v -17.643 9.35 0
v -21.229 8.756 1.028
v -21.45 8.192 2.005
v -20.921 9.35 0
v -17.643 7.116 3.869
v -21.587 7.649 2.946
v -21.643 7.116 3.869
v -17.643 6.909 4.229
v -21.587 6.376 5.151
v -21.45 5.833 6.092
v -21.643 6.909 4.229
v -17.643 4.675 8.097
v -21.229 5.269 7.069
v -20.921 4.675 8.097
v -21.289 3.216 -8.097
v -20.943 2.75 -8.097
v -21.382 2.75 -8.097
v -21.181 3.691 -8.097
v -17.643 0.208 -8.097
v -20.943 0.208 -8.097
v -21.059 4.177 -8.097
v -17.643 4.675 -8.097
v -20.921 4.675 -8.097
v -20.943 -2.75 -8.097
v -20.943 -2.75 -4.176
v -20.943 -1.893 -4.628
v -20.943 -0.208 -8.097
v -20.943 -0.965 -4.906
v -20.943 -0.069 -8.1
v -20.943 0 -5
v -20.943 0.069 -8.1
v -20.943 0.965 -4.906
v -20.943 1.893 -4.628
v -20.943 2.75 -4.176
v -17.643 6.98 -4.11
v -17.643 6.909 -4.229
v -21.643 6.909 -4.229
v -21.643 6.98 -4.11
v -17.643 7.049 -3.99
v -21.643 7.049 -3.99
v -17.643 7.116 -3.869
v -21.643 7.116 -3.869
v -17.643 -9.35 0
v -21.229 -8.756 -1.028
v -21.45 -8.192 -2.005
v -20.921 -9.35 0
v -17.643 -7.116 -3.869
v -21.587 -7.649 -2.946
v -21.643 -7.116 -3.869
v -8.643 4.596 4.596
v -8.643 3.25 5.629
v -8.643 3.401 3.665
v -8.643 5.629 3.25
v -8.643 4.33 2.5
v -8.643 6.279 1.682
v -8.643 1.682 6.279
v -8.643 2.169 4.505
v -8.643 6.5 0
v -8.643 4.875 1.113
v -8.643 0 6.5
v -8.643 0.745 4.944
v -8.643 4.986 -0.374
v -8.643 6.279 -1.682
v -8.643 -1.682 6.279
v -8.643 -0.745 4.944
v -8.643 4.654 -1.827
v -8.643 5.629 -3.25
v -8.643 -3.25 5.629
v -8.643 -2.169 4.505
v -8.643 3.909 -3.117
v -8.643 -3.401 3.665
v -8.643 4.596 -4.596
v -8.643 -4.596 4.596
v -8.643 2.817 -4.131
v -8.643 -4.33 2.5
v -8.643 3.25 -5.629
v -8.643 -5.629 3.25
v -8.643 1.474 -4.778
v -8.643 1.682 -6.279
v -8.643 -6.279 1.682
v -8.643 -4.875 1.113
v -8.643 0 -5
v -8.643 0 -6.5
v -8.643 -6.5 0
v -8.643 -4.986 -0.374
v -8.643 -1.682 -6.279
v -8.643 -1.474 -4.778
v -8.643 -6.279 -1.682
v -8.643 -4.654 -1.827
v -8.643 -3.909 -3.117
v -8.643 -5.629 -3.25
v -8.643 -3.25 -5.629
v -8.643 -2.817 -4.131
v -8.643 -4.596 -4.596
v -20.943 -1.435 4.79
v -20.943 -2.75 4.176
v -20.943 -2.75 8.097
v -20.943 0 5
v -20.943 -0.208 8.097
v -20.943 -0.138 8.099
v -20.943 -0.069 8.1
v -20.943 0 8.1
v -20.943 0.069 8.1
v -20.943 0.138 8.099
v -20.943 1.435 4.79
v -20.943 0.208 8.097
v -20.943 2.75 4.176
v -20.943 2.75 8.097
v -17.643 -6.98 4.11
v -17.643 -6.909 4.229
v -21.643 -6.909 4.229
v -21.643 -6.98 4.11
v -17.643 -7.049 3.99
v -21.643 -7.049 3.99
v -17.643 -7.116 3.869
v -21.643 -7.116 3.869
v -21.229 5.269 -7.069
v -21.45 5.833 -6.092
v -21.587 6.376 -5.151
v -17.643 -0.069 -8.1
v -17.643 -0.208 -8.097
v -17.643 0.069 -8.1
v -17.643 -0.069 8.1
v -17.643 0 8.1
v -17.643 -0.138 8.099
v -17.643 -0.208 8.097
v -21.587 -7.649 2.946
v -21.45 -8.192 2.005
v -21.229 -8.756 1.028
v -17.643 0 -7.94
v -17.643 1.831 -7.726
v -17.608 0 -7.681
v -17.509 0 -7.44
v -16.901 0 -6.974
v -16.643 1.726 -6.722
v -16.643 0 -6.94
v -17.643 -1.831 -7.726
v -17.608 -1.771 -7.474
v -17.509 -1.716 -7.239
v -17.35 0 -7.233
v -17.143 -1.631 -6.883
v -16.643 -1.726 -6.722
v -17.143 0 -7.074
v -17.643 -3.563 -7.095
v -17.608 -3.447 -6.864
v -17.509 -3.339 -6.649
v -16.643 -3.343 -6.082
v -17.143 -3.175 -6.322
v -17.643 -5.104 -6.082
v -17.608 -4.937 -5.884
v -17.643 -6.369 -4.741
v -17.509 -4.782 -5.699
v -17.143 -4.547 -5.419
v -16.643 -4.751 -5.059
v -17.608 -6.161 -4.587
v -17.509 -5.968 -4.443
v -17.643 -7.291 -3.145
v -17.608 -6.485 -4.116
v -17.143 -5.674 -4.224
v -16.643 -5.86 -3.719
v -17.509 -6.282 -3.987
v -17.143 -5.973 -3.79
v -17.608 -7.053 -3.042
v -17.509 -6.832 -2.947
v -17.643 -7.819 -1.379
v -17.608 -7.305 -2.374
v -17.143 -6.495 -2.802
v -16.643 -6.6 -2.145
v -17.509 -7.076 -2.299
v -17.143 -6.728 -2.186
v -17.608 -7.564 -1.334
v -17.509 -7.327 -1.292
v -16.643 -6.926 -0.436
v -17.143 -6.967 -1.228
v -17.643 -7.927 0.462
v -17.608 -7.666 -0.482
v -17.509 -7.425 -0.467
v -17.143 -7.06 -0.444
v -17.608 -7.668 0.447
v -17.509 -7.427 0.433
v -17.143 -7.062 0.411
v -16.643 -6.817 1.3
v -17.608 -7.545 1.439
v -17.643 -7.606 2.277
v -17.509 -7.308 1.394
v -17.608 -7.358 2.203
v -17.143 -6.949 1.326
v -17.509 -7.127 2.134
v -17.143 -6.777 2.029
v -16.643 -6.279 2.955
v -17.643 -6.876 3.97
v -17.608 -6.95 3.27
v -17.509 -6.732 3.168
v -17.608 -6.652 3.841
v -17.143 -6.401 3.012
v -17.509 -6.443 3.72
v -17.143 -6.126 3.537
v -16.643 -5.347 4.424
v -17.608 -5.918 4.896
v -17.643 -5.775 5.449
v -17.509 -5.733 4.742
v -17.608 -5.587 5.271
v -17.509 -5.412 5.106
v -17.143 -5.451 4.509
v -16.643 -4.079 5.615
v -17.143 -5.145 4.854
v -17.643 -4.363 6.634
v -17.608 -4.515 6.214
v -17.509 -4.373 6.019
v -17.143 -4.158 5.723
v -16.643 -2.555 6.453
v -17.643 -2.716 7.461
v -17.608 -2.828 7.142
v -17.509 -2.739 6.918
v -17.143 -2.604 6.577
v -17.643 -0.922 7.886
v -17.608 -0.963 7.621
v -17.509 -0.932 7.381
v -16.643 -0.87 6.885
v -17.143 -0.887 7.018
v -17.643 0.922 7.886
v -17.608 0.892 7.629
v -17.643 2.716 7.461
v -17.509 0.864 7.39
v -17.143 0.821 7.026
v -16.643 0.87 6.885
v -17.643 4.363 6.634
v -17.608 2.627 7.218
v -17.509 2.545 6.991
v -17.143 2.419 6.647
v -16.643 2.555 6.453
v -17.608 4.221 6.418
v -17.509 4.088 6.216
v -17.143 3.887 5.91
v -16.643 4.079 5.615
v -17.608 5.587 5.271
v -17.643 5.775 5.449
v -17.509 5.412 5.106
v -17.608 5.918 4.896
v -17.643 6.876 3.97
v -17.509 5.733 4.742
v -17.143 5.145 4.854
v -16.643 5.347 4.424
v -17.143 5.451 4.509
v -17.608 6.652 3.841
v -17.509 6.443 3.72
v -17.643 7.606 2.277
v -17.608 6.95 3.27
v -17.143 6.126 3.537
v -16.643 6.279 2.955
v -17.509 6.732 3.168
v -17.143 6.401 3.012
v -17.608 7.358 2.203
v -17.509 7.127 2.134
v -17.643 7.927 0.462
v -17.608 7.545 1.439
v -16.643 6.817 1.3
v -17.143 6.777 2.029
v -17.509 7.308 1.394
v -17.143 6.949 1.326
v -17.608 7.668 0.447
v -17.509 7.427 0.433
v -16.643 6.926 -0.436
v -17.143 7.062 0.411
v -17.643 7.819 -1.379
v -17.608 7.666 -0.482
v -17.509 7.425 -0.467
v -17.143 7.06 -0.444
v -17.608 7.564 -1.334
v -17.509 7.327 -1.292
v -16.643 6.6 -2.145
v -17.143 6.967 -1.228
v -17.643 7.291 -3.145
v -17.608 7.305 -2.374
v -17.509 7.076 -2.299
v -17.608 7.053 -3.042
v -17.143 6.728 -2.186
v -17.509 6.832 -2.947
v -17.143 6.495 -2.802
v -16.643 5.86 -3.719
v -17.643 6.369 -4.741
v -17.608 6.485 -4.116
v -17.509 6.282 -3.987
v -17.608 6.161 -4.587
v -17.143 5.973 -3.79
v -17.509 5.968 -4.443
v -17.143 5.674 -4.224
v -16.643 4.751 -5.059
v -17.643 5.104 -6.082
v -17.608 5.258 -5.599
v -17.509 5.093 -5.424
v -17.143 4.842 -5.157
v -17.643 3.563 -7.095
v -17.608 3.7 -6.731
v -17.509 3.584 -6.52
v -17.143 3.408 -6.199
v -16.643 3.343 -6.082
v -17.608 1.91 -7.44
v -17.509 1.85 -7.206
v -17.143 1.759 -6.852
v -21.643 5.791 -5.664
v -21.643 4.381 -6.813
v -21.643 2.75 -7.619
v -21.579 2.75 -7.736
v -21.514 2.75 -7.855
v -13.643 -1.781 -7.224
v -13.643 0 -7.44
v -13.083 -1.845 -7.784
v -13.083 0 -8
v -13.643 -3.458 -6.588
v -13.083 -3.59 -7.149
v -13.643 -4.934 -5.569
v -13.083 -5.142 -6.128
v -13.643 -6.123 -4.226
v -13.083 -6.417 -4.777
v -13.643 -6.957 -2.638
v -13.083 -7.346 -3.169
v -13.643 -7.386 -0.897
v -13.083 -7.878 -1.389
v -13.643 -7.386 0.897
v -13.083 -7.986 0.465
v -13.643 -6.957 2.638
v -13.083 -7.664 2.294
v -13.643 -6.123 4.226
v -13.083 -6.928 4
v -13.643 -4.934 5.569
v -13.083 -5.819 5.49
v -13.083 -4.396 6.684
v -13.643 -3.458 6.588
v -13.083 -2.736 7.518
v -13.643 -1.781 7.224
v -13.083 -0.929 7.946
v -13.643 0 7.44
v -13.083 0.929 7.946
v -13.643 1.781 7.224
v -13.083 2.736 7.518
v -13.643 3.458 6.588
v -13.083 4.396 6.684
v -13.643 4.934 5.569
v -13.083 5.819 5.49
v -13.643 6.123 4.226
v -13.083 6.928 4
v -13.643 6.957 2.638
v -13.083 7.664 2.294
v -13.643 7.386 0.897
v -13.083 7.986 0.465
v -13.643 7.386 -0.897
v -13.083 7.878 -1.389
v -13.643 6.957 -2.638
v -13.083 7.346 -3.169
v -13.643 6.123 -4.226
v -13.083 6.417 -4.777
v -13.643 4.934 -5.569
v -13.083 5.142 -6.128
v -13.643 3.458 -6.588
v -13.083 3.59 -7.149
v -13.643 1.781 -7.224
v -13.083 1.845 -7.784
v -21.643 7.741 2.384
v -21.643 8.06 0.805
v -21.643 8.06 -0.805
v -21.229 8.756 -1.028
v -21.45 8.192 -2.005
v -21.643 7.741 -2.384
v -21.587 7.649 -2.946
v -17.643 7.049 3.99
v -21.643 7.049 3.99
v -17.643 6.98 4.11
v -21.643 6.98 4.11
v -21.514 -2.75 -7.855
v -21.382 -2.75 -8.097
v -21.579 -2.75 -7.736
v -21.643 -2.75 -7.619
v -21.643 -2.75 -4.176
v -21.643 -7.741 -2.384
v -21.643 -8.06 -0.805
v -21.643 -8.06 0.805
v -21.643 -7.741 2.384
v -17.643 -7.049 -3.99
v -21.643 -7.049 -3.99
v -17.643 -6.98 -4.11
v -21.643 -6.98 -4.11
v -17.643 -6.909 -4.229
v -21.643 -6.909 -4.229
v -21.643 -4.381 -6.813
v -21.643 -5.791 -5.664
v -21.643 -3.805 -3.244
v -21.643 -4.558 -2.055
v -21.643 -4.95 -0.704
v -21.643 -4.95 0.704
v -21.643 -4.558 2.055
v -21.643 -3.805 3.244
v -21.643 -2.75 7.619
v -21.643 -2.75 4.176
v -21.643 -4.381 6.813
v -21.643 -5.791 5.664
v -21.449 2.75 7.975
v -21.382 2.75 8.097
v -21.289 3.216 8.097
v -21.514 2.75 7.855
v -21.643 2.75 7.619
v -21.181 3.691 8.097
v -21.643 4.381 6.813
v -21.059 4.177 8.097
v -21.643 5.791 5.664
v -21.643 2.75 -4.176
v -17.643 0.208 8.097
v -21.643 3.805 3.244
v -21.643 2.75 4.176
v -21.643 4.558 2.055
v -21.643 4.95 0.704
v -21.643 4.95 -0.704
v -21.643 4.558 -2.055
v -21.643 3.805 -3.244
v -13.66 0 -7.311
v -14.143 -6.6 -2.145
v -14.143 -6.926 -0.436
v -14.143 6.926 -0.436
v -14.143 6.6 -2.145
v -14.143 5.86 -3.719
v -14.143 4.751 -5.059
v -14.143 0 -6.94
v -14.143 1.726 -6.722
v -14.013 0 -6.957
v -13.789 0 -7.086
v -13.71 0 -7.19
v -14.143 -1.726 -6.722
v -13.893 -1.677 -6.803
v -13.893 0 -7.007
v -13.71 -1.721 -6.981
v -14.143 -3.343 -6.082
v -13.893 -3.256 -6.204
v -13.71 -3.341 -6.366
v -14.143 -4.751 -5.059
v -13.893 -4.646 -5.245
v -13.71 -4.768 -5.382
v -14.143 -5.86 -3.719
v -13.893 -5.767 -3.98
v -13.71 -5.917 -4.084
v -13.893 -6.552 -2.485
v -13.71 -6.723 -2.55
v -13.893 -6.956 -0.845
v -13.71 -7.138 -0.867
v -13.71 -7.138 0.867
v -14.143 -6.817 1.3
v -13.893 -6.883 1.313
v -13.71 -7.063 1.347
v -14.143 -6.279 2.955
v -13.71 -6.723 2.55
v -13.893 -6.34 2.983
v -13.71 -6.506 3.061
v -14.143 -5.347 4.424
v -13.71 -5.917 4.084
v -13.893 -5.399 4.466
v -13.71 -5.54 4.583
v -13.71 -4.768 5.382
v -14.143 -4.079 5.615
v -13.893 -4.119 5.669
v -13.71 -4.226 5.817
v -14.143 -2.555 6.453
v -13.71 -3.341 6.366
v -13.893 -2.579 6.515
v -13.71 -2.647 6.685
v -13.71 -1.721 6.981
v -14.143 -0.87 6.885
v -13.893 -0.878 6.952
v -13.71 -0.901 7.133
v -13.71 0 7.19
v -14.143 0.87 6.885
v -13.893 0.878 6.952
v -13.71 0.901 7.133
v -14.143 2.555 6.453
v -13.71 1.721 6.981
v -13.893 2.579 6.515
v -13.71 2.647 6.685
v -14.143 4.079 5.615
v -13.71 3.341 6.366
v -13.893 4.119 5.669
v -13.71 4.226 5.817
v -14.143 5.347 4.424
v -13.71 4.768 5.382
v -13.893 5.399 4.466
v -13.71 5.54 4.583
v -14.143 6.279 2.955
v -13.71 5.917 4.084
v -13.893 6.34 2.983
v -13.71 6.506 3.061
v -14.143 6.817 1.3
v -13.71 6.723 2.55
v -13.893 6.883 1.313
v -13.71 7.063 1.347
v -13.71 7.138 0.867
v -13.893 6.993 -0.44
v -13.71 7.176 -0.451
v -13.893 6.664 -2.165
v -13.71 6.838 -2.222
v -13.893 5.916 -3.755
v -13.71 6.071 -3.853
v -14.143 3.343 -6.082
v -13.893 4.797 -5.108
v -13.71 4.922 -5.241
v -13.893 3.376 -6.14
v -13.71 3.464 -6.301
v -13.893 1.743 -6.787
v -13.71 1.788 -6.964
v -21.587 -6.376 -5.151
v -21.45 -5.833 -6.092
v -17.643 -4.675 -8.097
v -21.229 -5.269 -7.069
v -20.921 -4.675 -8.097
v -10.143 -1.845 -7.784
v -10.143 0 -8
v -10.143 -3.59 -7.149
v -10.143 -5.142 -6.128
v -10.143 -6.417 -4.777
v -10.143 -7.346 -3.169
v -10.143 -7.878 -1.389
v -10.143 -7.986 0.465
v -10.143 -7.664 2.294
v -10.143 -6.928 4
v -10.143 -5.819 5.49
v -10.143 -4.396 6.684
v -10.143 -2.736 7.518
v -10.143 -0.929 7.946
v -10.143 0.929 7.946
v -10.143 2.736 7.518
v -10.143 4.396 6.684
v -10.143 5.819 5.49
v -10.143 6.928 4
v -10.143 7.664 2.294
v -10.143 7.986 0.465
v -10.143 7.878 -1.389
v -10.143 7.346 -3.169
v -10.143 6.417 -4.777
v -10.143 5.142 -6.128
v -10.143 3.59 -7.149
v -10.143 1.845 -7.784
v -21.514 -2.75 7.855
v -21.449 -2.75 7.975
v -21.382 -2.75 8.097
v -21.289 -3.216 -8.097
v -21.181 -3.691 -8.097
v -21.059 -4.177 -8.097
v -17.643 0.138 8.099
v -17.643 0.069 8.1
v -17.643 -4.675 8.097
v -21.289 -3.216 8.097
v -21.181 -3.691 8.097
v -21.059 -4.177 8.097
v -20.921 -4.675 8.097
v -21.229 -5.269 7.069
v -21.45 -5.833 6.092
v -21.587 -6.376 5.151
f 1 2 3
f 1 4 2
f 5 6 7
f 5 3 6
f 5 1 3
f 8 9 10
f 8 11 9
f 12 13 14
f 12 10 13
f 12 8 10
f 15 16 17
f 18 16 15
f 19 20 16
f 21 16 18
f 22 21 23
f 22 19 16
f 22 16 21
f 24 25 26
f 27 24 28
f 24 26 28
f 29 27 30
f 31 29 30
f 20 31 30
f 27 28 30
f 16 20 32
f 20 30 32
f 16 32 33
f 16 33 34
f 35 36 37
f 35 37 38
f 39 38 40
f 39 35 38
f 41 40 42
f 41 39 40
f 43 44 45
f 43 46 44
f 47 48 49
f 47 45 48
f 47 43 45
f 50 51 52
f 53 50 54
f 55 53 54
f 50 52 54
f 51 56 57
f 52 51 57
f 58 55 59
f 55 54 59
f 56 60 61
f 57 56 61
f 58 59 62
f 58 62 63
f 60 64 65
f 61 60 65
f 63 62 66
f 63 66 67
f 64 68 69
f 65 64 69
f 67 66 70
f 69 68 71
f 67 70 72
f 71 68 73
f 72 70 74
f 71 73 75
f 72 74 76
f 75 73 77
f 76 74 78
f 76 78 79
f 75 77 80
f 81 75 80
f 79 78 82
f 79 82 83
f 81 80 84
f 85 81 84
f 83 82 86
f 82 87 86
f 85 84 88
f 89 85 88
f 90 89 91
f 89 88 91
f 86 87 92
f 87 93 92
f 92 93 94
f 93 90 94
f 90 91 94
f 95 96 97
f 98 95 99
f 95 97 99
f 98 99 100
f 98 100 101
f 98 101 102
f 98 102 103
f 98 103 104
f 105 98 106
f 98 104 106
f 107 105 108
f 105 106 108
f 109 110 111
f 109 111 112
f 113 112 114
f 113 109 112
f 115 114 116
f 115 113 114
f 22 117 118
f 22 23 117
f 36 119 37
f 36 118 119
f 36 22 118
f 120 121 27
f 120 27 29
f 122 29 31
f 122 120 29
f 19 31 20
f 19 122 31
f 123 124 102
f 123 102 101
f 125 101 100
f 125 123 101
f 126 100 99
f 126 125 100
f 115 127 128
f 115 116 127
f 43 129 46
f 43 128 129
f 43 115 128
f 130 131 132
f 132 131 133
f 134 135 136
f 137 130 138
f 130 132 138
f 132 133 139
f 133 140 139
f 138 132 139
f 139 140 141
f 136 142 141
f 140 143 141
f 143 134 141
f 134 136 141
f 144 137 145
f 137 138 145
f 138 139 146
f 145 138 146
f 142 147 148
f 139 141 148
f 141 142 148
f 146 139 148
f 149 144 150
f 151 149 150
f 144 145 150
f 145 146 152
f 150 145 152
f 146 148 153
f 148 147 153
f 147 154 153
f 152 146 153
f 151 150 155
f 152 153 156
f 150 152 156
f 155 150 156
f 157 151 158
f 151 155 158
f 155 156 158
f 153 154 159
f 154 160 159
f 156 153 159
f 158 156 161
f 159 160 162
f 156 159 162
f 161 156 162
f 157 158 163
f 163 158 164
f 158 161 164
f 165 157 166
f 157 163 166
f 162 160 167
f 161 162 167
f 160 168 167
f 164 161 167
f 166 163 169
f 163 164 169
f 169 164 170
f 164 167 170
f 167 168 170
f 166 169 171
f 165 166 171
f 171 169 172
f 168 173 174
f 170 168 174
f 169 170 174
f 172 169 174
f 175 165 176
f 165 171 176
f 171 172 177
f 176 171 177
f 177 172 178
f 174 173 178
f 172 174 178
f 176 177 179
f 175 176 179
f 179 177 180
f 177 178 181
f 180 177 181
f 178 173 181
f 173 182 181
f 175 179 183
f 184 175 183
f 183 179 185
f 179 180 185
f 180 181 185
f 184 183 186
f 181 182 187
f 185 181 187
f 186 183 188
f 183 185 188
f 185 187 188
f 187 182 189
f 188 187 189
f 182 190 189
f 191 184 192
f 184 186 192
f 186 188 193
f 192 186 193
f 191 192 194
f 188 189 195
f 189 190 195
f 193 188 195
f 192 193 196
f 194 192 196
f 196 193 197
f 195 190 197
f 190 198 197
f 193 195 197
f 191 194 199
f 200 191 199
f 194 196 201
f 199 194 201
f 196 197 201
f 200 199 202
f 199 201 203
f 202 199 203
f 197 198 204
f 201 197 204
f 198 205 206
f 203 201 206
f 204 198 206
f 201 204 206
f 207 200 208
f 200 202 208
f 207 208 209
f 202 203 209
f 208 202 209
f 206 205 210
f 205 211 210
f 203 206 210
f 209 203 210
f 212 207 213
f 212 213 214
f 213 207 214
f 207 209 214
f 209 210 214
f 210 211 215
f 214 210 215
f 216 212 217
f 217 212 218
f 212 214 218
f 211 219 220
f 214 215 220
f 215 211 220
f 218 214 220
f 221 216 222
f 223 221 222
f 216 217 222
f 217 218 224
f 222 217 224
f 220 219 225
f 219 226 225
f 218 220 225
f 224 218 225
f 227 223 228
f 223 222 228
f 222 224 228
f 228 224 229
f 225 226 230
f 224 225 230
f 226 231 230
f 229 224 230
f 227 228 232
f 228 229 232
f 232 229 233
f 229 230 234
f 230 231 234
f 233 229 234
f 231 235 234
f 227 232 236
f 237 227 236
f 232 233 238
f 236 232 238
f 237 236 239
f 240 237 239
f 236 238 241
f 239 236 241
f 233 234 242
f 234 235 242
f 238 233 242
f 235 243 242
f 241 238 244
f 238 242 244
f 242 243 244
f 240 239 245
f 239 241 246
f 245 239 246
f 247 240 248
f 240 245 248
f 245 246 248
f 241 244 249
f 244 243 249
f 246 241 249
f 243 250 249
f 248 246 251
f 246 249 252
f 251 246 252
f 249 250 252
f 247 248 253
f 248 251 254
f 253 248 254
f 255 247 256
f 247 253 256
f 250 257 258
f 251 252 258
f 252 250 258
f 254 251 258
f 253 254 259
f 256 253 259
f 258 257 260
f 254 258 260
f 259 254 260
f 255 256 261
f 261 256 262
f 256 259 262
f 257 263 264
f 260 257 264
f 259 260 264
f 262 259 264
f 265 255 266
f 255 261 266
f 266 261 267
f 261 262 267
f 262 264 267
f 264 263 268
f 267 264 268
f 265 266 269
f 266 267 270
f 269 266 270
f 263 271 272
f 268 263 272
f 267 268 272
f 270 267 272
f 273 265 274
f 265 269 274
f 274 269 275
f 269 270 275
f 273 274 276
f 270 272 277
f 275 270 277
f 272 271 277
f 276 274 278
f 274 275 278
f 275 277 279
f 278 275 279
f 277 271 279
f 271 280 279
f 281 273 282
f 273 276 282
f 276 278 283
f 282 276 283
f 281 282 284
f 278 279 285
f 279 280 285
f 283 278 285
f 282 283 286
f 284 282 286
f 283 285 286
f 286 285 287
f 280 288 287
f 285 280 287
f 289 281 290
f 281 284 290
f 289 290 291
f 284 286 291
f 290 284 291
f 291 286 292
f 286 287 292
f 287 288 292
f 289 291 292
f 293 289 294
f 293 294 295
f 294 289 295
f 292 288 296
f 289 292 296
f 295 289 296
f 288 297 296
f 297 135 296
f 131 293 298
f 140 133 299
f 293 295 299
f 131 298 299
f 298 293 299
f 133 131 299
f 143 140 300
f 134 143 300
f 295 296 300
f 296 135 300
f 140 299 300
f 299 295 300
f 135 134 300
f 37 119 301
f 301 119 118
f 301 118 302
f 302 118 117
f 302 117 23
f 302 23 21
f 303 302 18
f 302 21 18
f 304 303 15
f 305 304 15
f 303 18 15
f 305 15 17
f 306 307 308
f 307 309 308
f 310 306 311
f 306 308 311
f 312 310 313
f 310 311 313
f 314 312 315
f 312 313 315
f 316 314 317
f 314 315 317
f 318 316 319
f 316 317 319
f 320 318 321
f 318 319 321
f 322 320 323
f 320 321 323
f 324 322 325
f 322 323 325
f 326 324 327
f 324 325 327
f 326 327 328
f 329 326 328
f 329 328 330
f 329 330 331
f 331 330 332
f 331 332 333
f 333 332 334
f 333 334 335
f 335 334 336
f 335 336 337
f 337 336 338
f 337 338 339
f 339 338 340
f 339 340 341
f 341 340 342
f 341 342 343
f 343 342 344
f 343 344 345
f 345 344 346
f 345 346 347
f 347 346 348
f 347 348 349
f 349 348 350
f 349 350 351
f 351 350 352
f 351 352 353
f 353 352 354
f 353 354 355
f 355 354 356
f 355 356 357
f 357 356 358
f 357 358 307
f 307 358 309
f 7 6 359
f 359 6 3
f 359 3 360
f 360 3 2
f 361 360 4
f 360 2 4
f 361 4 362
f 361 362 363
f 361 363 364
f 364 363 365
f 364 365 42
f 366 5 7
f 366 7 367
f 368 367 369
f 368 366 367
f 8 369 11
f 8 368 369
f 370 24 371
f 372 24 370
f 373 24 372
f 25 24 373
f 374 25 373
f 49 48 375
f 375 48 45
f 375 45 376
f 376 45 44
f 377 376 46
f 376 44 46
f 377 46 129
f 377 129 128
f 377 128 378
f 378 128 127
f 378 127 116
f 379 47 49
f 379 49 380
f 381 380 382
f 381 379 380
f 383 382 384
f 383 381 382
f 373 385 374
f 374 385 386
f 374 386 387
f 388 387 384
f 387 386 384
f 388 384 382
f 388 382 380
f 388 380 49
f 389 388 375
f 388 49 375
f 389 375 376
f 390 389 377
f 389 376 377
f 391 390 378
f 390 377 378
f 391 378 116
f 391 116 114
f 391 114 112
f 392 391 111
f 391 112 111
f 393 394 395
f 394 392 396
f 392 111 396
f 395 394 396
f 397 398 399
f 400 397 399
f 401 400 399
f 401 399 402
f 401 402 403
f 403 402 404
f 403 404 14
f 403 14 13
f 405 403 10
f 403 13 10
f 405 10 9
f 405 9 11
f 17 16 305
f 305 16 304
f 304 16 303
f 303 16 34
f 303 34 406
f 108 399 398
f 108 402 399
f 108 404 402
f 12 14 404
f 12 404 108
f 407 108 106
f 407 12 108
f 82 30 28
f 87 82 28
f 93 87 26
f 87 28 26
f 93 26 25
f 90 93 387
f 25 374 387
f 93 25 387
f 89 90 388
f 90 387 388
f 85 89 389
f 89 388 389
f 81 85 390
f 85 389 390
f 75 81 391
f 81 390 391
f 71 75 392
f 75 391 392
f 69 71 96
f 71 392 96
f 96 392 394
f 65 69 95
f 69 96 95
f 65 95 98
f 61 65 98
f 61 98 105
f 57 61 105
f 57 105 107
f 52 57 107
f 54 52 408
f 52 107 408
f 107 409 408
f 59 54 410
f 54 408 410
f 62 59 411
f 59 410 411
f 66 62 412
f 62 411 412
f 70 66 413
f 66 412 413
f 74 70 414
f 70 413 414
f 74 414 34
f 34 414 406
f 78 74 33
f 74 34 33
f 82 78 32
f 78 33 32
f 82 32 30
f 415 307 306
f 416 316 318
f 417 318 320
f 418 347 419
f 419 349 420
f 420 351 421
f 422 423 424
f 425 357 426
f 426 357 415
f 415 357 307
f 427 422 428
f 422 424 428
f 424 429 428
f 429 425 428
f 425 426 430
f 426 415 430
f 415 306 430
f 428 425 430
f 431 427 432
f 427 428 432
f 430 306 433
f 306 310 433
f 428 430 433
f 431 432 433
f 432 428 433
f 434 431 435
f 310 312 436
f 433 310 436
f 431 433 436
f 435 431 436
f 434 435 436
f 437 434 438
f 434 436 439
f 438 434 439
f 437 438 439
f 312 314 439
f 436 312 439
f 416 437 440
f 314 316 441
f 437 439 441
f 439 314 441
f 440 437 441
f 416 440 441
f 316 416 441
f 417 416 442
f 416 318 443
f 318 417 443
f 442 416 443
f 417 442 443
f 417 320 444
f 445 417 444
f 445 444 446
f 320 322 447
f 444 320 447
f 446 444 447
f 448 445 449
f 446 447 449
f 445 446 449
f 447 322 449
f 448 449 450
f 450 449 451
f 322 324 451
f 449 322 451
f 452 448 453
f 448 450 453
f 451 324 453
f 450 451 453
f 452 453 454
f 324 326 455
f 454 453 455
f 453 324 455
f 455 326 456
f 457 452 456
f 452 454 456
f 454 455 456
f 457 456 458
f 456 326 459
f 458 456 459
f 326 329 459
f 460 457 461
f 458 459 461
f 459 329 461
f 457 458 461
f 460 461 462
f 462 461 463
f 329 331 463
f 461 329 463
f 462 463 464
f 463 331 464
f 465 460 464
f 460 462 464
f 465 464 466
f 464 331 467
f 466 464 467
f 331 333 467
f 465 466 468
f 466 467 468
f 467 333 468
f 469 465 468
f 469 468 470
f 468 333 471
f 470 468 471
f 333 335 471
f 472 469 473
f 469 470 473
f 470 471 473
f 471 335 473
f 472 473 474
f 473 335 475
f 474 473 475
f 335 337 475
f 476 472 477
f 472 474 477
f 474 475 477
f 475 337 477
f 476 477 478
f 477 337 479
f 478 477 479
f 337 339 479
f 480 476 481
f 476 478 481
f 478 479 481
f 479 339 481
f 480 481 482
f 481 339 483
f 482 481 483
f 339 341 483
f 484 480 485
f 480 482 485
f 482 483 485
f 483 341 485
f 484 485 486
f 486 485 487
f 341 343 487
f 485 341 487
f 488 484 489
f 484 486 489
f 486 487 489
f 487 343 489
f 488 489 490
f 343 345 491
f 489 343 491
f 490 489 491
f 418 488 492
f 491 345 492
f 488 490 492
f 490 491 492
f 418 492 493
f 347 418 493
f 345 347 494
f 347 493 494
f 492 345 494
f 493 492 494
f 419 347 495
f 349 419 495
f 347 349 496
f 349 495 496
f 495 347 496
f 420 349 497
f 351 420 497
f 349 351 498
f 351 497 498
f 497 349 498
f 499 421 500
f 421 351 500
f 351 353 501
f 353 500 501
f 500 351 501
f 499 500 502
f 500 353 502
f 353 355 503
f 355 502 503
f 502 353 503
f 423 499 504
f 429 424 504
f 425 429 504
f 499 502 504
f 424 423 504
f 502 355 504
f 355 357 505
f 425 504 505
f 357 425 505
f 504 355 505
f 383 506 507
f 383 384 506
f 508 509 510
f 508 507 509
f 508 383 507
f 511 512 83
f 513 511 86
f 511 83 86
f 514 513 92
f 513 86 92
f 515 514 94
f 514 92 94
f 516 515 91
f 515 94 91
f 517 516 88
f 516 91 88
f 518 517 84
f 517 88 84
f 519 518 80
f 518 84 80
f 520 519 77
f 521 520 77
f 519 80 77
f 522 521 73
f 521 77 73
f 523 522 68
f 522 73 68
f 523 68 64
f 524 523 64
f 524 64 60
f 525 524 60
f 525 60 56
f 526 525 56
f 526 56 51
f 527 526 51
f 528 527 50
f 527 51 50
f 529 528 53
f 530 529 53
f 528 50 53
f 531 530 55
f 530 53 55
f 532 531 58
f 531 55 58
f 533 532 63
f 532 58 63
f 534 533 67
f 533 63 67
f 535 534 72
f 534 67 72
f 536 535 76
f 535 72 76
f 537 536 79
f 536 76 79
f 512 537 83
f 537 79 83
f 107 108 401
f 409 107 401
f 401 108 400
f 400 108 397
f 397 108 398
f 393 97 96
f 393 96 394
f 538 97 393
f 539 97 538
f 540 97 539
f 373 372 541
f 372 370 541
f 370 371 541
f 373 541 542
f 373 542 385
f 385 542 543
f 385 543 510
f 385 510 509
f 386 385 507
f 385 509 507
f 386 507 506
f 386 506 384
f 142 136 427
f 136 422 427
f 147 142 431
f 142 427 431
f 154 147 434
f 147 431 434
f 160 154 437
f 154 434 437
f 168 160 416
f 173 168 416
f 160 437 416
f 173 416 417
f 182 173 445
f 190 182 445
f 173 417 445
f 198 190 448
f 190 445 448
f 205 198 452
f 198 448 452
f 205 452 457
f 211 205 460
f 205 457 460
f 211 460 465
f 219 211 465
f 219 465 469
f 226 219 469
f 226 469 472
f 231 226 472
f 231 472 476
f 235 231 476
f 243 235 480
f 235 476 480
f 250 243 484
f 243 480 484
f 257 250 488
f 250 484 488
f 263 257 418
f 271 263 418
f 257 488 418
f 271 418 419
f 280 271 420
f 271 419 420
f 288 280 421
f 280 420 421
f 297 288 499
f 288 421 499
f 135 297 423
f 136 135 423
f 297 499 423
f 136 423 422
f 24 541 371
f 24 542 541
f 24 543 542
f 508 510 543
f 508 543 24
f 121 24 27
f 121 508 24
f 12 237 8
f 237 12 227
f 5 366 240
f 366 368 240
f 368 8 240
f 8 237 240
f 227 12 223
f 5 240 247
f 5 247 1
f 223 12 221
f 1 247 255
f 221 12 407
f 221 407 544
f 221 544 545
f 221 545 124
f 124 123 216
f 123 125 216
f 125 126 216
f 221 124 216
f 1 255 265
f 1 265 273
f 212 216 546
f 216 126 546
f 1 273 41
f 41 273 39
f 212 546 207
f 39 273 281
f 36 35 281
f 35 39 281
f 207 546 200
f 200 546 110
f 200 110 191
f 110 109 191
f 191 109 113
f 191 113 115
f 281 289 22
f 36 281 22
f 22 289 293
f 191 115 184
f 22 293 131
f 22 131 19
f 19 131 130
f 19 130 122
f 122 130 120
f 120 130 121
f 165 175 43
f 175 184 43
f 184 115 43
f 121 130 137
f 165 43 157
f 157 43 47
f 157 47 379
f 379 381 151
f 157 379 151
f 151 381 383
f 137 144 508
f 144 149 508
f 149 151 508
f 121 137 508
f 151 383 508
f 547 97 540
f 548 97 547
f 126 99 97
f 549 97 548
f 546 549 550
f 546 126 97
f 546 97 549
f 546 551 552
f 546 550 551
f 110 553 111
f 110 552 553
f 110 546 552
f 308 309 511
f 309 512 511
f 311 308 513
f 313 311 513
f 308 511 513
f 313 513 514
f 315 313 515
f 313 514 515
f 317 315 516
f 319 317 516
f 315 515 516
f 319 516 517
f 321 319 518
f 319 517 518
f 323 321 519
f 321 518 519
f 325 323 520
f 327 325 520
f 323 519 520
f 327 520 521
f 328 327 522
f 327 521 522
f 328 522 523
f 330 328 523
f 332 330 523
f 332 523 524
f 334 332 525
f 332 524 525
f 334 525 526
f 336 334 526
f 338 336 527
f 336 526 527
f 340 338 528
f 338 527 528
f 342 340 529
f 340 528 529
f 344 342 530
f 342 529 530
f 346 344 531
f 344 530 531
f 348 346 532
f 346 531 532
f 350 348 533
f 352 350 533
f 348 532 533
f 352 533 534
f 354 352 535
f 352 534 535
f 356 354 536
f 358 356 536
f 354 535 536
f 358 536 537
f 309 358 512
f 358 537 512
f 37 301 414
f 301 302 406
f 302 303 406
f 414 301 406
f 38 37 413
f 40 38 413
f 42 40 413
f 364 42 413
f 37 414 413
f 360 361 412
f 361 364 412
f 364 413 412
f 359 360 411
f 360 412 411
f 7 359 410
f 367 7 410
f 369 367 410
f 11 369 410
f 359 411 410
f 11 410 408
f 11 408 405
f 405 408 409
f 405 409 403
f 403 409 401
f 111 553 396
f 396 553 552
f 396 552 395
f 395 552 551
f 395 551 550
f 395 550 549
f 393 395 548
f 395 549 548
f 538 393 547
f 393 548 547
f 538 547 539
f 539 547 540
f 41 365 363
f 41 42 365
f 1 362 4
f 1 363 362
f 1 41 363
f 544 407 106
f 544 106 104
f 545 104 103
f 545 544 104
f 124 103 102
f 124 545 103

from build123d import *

# Parameters (mm, degrees)
CUT_EXTRUDE_START        = -10
CUT_EXTRUDE_1_DEPTH      = 10
CUT_EXTRUDE_2_DEPTH      = 29.603774074
CUT_EXTRUDE_2_DEPTH_BACK = 29.603774074
SKETCH_3_W               = 1.4
SKETCH_3_H               = 5.5


with BuildPart() as part:
    # Эскиз1 → Повернуть1 (revolve)
    with BuildSketch(Plane(origin=(0, 0, 0), x_dir=(1, 0, 0), z_dir=(0, 1, 0)), mode=Mode.PRIVATE) as revolve_1_sk:
        with BuildLine():
            Line((-8.642542558, -6.5), (-8.642542558, -5))
            Line((-8.642542558, -5), (-21.642542558, -5))
            Line((-21.642542558, -5), (-21.642542558, -8.1))
            Line((-21.642542558, -8.1), (-20.920854721, -9.35))
            Line((-20.920854721, -9.35), (-17.642542558, -9.35))
            Line((-17.642542558, -9.35), (-17.642542558, -7.94))
            ThreePointArc((-17.642542558, -7.94), (-17.349649339, -7.232893219), (-16.642542558, -6.94))
            Line((-16.642542558, -6.94), (-14.142542558, -6.94))
            ThreePointArc((-14.142542558, -6.94), (-13.788989167, -7.086446609), (-13.642542558, -7.44))
            Line((-13.642542558, -7.44), (-13.082542558, -8))
            Line((-13.082542558, -8), (-10.142542558, -8))
            Line((-10.142542558, -8), (-8.642542558, -6.5))
        make_face()
    revolve(revolve_1_sk.sketch.rotate(Axis((24.823529412, 0, 0), (-1, 0, 0)), 180), axis=Axis((24.823529412, 0, 0), (-1, 0, 0)))

    # Эскиз2 → Вырез-Вытянуть1 (cut)
    with BuildSketch(Plane.ZY.offset(21.642542558).offset(CUT_EXTRUDE_START)):
        with BuildLine():
            Line((-8.097337525, 0.207665597), (-8.097337525, 4.675))
            ThreePointArc((-8.097337525, 4.675), (-9.35, 0), (-8.097337525, -4.675))
            Line((-8.097337525, -4.675), (-8.097337525, -0.207665597))
            ThreePointArc((-8.097337525, -0.207665597), (-8.1, 0), (-8.097337525, 0.207665597))
        make_face()
        with BuildLine():
            Line((-3.868825081, 7.116332798), (0, 9.35))
            ThreePointArc((0, 9.35), (-4.675, 8.097337525), (-8.097337525, 4.675))
            Line((-8.097337525, 4.675), (-4.228512445, 6.908667202))
            ThreePointArc((-4.228512445, 6.908667202), (-4.05, 7.014805771), (-3.868825081, 7.116332798))
        make_face()
        with BuildLine():
            ThreePointArc((8.097337525, 4.675), (4.675, 8.097337525), (0, 9.35))
            Line((0, 9.35), (3.868825081, 7.116332798))
            ThreePointArc((3.868825081, 7.116332798), (4.05, 7.014805771), (4.228512445, 6.908667202))
            Line((4.228512445, 6.908667202), (8.097337525, 4.675))
        make_face()
        with BuildLine():
            ThreePointArc((9.35, 0), (9.031406476, 2.419958072), (8.097337525, 4.675))
            Line((8.097337525, 4.675), (8.097337525, 0.207665597))
            ThreePointArc((8.097337525, 0.207665597), (8.099334354, 0.103841332), (8.1, 0))
            ThreePointArc((8.1, 0), (8.099334354, -0.103841332), (8.097337525, -0.207665597))
            Line((8.097337525, -0.207665597), (8.097337525, -4.675))
            ThreePointArc((8.097337525, -4.675), (9.031406476, -2.419958072), (9.35, 0))
        make_face()
        with BuildLine():
            ThreePointArc((0, -9.35), (4.675, -8.097337525), (8.097337525, -4.675))
            Line((8.097337525, -4.675), (4.228512445, -6.908667202))
            ThreePointArc((4.228512445, -6.908667202), (4.05, -7.014805771), (3.868825081, -7.116332798))
            Line((3.868825081, -7.116332798), (0, -9.35))
        make_face()
        with BuildLine():
            Line((-4.228512445, -6.908667202), (-8.097337525, -4.675))
            ThreePointArc((-8.097337525, -4.675), (-4.675, -8.097337525), (0, -9.35))
            Line((0, -9.35), (-3.868825081, -7.116332798))
            ThreePointArc((-3.868825081, -7.116332798), (-4.05, -7.014805771), (-4.228512445, -6.908667202))
        make_face()
    extrude(amount=CUT_EXTRUDE_1_DEPTH, mode=Mode.SUBTRACT)

    # Эскиз3 → Вырез-Вытянуть2 (cut, two sides: drawn at the far end of the back side and taken through both)
    with BuildSketch(Plane(origin=(0, 0, -8.097337525), x_dir=(-1, 0, 0), z_dir=(0, 0, -1)).offset(-CUT_EXTRUDE_2_DEPTH_BACK)):
        with Locations((21.642542558, 0)):
            Rectangle(SKETCH_3_W, SKETCH_3_H)
    extrude(amount=CUT_EXTRUDE_2_DEPTH + CUT_EXTRUDE_2_DEPTH_BACK, mode=Mode.SUBTRACT)


solid = part.part
